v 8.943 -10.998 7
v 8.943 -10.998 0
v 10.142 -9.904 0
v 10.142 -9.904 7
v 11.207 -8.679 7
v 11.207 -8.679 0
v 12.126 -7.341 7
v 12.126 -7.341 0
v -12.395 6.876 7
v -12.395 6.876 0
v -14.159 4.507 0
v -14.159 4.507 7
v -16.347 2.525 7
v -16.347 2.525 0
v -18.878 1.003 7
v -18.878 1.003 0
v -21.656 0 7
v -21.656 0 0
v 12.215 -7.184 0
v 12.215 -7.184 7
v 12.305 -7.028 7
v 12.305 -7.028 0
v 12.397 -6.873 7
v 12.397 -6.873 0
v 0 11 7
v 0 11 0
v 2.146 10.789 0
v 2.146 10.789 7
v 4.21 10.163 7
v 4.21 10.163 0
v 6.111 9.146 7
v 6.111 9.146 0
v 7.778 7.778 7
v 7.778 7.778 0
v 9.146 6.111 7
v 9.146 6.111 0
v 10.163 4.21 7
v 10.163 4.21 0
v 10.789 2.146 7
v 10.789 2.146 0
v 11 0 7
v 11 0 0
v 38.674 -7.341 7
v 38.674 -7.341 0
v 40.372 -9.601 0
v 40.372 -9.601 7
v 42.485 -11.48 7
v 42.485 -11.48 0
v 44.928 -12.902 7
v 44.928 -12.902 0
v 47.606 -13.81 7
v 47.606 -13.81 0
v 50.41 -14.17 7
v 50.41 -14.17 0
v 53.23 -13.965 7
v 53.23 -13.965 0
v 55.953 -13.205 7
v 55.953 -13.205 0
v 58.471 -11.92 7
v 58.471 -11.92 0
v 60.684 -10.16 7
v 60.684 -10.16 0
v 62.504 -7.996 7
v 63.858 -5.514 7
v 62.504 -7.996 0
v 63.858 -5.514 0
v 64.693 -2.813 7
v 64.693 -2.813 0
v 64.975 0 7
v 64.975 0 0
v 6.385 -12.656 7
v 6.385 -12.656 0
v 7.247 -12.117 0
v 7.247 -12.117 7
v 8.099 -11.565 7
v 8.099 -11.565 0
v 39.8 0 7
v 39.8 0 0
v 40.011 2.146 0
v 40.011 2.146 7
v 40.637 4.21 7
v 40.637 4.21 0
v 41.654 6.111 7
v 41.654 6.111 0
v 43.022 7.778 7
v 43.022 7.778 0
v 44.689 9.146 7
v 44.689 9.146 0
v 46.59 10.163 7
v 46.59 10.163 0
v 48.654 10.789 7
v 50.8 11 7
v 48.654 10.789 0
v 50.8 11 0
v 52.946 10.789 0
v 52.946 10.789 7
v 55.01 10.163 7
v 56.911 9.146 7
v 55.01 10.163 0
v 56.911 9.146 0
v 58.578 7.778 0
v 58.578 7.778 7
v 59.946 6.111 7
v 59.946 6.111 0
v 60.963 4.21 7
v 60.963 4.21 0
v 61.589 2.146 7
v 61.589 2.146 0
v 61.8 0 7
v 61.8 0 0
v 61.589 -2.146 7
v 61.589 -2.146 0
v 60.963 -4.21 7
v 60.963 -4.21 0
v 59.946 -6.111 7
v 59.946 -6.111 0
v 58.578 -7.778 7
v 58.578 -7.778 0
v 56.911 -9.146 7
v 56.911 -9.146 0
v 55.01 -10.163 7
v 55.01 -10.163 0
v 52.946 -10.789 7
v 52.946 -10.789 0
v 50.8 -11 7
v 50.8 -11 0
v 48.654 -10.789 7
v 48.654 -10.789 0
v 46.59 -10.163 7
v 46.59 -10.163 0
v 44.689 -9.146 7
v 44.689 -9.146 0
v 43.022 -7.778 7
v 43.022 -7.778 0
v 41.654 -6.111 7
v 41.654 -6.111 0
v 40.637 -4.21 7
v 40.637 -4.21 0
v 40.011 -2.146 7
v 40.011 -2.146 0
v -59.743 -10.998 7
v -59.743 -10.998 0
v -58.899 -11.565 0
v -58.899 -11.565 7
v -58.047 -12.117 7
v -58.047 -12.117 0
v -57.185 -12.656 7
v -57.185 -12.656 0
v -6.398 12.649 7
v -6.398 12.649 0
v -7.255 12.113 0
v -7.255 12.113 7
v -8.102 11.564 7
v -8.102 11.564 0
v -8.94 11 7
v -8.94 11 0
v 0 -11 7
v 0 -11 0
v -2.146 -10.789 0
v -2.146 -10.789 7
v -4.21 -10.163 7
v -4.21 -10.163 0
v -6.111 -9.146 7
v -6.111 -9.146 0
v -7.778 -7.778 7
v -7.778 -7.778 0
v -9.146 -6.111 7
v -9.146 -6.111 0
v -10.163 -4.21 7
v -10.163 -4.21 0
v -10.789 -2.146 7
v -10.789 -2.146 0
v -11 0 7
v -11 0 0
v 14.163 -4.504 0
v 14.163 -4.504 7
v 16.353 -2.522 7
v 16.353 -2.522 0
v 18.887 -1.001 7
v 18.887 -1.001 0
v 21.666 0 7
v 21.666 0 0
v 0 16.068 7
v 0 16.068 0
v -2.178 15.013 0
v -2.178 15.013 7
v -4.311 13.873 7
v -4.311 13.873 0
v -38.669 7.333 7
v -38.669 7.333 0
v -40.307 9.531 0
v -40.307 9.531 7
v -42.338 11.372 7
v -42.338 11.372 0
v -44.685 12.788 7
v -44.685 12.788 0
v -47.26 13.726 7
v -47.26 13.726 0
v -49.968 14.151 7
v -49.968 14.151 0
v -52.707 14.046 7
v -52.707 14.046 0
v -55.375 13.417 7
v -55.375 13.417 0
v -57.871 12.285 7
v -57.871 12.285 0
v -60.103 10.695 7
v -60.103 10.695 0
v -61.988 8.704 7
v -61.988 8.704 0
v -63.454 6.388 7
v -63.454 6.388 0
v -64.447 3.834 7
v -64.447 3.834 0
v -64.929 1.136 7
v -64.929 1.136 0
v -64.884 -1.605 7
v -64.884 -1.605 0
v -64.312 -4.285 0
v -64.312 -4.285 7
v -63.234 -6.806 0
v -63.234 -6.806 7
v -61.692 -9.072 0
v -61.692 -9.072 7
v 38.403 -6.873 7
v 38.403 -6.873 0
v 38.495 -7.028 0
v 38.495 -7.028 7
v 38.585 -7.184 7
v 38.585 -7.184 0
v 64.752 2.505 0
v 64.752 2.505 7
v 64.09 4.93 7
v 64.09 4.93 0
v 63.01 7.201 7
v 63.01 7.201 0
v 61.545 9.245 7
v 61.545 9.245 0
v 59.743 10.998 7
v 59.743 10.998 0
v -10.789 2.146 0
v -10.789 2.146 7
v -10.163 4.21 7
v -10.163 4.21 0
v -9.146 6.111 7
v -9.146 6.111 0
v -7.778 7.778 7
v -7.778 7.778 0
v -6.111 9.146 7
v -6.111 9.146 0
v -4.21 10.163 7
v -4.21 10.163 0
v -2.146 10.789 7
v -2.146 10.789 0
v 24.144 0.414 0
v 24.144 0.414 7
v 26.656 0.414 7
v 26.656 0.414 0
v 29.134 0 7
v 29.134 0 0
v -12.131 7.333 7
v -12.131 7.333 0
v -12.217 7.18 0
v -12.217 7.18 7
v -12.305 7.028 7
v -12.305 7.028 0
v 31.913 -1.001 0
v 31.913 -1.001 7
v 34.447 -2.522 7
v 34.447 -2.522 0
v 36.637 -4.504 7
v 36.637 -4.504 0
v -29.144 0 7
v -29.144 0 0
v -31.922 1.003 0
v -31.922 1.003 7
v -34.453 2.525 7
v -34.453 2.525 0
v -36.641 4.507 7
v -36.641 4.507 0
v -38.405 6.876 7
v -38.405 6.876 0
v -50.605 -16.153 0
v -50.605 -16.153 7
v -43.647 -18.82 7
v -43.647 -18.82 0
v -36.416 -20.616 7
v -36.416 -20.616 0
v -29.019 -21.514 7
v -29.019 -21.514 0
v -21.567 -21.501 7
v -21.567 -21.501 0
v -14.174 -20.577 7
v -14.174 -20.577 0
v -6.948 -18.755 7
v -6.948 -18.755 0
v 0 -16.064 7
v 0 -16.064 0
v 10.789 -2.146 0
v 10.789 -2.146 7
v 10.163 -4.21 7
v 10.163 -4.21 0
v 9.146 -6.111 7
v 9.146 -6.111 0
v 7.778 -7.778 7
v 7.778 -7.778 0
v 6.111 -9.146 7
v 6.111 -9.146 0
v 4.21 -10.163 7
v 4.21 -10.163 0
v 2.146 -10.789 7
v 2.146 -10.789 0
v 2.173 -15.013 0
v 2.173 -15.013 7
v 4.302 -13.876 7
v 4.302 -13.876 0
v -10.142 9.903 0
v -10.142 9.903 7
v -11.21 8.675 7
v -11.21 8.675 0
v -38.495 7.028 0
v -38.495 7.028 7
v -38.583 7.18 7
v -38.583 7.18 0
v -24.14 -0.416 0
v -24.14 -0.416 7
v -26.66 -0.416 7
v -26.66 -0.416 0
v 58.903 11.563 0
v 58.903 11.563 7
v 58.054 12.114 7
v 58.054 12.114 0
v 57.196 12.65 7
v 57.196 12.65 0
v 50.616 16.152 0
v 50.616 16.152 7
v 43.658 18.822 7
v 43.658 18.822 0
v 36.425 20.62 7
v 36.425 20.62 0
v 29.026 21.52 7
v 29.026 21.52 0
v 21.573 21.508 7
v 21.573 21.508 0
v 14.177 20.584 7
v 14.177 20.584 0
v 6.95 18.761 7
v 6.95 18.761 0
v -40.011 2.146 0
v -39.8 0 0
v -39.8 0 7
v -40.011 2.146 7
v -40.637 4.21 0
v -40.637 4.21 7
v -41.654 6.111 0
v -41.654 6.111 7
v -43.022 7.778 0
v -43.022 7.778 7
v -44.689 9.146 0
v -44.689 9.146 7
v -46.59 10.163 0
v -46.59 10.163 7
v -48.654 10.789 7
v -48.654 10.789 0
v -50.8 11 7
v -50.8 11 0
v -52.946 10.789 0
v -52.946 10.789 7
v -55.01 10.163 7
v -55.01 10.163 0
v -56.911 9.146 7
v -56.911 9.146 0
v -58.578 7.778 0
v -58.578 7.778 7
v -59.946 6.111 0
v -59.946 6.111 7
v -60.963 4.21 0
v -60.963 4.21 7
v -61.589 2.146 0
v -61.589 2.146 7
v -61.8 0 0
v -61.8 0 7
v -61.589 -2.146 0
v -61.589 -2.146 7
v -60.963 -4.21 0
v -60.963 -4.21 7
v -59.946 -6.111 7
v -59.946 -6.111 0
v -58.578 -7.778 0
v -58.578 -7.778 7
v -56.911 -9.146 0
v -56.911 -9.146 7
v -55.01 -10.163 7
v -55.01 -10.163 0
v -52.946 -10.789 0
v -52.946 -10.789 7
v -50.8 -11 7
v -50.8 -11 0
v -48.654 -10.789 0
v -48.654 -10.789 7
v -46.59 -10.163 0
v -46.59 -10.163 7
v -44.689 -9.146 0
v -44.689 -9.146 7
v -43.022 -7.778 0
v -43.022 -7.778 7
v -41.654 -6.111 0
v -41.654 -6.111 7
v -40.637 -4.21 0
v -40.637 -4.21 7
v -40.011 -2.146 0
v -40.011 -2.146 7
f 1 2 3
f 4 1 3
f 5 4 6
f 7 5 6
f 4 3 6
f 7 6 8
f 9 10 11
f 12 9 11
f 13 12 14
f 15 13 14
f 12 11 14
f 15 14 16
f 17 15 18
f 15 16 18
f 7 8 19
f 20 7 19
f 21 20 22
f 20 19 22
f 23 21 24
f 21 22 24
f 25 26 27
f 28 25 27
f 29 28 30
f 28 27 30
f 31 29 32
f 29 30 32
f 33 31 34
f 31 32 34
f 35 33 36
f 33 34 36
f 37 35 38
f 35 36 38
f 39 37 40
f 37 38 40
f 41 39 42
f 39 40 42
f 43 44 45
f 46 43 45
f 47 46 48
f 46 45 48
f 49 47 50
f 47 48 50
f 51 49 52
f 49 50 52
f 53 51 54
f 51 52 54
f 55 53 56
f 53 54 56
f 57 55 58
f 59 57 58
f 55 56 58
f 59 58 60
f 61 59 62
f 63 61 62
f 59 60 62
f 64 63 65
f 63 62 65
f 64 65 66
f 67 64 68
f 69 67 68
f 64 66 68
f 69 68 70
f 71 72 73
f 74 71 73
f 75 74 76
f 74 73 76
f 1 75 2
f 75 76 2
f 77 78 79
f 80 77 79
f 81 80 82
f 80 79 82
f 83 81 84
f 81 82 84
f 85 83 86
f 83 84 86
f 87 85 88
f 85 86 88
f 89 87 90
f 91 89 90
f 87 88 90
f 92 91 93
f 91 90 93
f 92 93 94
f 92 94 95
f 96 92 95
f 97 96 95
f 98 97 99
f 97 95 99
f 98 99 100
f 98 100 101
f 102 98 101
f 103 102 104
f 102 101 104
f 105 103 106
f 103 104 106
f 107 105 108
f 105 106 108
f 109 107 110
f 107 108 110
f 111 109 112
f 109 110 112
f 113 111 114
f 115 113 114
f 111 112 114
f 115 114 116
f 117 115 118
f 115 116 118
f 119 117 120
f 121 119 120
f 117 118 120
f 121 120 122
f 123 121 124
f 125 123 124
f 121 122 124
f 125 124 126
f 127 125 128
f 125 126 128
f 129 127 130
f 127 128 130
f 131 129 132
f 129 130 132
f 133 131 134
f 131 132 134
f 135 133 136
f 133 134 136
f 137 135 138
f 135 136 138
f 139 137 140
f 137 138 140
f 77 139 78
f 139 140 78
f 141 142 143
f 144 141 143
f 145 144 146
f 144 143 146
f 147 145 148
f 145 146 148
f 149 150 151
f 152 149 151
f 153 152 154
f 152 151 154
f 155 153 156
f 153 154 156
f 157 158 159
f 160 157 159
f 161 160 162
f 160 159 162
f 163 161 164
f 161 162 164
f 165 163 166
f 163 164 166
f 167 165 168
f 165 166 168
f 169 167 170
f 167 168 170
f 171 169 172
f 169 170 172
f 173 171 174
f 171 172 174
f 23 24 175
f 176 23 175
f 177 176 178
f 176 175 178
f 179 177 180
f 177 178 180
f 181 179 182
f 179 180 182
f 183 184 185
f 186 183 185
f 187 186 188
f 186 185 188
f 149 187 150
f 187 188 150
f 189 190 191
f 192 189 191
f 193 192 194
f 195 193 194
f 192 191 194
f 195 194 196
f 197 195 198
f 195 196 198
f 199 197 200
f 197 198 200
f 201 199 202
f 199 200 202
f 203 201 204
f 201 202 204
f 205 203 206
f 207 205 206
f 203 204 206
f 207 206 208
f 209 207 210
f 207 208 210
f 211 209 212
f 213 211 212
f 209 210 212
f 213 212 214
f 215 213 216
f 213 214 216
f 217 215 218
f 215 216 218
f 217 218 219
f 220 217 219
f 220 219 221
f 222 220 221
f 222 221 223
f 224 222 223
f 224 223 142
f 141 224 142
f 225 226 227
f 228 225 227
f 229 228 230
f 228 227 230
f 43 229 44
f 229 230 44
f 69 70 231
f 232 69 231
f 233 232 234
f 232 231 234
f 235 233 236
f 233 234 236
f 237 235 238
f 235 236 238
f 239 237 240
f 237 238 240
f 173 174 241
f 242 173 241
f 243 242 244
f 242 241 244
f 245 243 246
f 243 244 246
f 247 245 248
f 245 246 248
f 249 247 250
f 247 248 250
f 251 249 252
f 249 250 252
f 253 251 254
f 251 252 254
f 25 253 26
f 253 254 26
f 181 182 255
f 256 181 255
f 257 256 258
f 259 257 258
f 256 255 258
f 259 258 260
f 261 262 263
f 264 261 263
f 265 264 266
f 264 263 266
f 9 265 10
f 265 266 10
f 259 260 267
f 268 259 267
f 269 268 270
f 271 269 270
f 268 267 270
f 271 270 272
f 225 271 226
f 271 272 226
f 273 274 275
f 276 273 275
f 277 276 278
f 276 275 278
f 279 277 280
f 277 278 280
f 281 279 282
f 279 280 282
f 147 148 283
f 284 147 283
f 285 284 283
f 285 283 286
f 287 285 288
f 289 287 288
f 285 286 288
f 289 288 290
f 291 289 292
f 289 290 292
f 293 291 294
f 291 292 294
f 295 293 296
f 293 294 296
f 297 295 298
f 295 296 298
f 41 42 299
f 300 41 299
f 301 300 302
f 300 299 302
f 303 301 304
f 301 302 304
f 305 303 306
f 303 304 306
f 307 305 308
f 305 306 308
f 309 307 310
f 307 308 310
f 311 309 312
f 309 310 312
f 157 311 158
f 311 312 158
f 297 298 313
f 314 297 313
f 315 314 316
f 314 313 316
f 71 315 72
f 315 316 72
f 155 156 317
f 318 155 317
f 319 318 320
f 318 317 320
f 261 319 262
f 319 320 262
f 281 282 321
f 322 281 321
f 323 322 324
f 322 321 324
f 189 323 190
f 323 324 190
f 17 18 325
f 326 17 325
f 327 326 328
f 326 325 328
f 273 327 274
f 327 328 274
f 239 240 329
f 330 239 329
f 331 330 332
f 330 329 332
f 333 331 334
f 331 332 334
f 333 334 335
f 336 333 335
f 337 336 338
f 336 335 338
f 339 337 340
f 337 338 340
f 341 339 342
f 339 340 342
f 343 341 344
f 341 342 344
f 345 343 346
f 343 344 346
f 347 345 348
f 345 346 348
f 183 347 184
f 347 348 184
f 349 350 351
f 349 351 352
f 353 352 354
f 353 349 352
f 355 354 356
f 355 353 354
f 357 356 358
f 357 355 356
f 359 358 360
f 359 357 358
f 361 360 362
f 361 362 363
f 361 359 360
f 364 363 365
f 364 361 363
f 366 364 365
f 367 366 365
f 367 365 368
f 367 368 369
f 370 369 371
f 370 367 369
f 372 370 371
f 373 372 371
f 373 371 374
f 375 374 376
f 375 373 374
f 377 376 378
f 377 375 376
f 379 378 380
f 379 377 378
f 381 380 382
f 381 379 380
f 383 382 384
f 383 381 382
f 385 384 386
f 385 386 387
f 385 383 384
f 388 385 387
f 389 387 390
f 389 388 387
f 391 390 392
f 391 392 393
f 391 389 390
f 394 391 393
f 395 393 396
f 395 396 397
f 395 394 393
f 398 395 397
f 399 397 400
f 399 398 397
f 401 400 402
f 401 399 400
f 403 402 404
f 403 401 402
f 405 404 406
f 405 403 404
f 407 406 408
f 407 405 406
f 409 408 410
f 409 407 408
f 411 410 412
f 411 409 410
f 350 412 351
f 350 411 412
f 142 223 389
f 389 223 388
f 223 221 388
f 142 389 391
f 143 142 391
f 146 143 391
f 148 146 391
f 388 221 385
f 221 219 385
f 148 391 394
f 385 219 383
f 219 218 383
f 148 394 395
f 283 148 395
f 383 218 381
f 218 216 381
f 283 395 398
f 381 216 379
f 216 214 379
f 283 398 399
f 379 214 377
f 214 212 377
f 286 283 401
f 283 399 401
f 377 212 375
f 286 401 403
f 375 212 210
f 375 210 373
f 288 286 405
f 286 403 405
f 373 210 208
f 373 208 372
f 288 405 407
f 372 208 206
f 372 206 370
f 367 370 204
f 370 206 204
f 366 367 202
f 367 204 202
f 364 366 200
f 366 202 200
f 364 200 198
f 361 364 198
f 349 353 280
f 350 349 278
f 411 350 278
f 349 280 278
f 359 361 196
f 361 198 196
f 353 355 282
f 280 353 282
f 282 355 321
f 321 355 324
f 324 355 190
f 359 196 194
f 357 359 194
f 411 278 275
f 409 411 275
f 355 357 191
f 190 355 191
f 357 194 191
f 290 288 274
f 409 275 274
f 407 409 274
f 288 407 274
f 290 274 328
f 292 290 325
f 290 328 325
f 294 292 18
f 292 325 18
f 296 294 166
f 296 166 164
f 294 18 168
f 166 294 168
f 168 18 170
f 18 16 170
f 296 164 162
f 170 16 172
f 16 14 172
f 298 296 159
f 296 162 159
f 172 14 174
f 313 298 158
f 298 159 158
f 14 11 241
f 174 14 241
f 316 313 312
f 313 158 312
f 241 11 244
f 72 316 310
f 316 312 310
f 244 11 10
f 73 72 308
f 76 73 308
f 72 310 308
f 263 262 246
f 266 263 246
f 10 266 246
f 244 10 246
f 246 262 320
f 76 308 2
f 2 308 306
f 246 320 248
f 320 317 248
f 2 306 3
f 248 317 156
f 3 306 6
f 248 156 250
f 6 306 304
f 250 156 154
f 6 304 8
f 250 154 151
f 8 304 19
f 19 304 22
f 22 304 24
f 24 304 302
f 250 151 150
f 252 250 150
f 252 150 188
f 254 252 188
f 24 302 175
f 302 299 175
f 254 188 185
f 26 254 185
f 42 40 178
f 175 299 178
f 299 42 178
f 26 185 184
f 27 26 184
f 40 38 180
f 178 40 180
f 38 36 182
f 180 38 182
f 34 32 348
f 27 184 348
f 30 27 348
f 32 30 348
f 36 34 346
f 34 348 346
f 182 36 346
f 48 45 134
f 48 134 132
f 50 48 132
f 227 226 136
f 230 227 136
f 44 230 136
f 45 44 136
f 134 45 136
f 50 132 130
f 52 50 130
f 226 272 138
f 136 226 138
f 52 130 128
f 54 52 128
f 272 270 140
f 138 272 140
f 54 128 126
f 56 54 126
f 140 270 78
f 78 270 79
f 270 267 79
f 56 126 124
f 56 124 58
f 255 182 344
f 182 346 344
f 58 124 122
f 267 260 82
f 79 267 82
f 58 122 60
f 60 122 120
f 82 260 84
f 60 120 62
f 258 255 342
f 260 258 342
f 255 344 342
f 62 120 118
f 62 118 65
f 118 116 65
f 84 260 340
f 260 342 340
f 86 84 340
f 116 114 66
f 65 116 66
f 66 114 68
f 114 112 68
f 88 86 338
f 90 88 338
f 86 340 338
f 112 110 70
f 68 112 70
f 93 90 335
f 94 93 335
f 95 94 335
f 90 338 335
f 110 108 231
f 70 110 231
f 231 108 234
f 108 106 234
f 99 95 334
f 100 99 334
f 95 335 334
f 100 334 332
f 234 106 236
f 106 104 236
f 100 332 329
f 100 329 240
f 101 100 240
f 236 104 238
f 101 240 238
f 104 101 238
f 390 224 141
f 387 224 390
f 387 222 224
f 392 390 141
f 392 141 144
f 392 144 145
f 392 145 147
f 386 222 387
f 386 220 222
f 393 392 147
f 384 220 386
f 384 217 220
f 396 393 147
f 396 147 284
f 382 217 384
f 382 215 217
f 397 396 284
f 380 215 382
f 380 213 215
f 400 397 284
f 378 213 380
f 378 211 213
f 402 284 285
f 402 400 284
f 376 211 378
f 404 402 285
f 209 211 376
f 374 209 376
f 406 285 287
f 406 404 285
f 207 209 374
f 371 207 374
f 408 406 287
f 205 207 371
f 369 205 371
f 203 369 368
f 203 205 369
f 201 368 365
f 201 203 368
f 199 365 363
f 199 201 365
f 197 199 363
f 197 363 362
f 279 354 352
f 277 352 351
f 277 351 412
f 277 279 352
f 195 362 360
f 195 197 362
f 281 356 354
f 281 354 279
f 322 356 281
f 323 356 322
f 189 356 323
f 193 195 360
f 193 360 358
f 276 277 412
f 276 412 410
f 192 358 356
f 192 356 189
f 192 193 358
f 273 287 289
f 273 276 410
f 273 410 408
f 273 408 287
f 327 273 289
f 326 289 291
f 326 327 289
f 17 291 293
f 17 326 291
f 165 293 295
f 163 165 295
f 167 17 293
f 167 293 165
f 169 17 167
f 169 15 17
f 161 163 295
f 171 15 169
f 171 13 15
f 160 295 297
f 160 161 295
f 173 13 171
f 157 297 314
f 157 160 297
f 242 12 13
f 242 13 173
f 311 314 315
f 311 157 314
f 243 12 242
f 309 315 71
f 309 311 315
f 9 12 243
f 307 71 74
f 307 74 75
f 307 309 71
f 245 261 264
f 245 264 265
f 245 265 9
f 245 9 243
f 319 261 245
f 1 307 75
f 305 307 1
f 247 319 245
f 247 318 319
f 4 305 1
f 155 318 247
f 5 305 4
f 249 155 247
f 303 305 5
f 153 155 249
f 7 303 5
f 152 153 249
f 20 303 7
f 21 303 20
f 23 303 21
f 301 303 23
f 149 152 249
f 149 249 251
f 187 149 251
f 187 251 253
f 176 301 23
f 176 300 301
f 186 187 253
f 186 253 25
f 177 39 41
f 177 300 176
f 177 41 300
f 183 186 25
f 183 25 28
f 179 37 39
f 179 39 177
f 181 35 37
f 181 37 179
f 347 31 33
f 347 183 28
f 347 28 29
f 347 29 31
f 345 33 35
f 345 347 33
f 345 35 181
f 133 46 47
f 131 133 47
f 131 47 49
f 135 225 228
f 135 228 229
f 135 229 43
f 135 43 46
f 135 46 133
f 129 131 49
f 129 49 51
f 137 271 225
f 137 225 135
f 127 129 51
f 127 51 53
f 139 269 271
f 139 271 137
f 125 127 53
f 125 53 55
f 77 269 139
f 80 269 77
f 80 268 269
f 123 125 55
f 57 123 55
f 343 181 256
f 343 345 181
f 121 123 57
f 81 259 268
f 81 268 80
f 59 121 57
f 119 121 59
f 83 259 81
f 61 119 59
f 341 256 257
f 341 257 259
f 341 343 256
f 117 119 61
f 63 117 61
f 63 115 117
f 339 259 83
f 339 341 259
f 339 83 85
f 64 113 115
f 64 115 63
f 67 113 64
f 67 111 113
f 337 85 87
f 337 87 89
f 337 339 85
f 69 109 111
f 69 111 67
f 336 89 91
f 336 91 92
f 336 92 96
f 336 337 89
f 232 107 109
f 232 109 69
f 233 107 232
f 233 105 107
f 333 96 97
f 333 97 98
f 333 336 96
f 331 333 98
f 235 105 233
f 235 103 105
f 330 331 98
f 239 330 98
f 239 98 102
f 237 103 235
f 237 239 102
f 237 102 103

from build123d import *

# Parameters (mm, degrees)
F0_R     = 11
F1_DEPTH = 7


with BuildPart() as f1:
    # F0 (on Top) → F1 (new body)
    with BuildSketch(Plane.XY):
        with BuildLine():
            Line((14.175, 0), (11, 0))
            ThreePointArc((11, 0), (7.7781745931, -7.7781745931), (0, -11))
            Line((0, -11), (0, -14.175))
            ThreePointArc((0, -14.175), (3.2814696071, -13.7899449679), (6.3846610647, -12.655699431))
            ThreePointArc((6.3846610647, -12.655699431), (7.6740188796, -11.8429761162), (8.9426071008, -10.9982))
            ThreePointArc((8.9426071008, -10.9982), (10.6919977036, -9.3065466262), (12.1262614453, -7.3406))
            ThreePointArc((12.1262614453, -7.3406), (12.2596266851, -7.1057126256), (12.3971479741, -6.8732341084))
            ThreePointArc((12.3971479741, -6.8732341084), (13.7233413849, -3.5497219939), (14.175, 0))
        make_face()
        with BuildLine():
            ThreePointArc((0, 11), (7.7781745931, 7.7781745931), (11, 0))
            Line((11, 0), (14.175, 0))
            ThreePointArc((14.175, 0), (10.0232386233, 10.0232386233), (0, 14.175))
            Line((0, 14.175), (0, 11))
        make_face()
        with BuildLine():
            ThreePointArc((-11, 0), (-7.7781745931, 7.7781745931), (0, 11))
            Line((0, 11), (0, 14.175))
            ThreePointArc((0, 14.175), (-3.2888623779, 13.7881836824), (-6.3982276645, 12.6488461036))
            ThreePointArc((-6.3982276645, 12.6488461036), (-7.6795852422, 11.8402648338), (-8.9403928885, 11))
            ThreePointArc((-8.9403928885, 11), (-10.6938487189, 9.304419626), (-12.1306573285, 7.3333333333))
            ThreePointArc((-12.1306573285, 7.3333333333), (-12.2610462299, 7.103700791), (-12.3954086387, 6.8763703856))
            ThreePointArc((-12.3954086387, 6.8763703856), (-13.7228922326, 3.5514579785), (-14.175, 0))
            Line((-14.175, 0), (-11, 0))
        make_face()
        with BuildLine():
            Line((0, -14.175), (0, -11))
            ThreePointArc((0, -11), (-7.7781745931, -7.7781745931), (-11, 0))
            Line((-11, 0), (-14.175, 0))
            ThreePointArc((-14.175, 0), (-10.0232386233, -10.0232386233), (0, -14.175))
        make_face()
        with BuildLine():
            ThreePointArc((0, 14.175), (10.0232386233, 10.0232386233), (14.175, 0))
            Line((14.175, 0), (21.6662, 0))
            ThreePointArc((21.6662, 0), (25.4, 0.4661082384), (29.1338, 0))
            Line((29.1338, 0), (36.625, 0))
            ThreePointArc((36.625, 0), (43.3747333645, 12.0746031153), (57.1958698966, 12.650038469))
            ThreePointArc((57.1958698966, 12.650038469), (29.0258725789, 21.5203456529), (0, 16.0678398574))
            Line((0, 16.0678398574), (0, 14.175))
        make_face()
        with BuildLine():
            Line((21.6662, 0), (14.175, 0))
            ThreePointArc((14.175, 0), (13.7233413849, -3.5497219939), (12.3971479741, -6.8732341084))
            ThreePointArc((12.3971479741, -6.8732341084), (16.353496972, -2.5220464261), (21.6662, 0))
        make_face()
        with BuildLine():
            ThreePointArc((-6.3982276645, 12.6488461036), (-3.2888623779, 13.7881836824), (0, 14.175))
            Line((0, 14.175), (0, 16.0678398574))
            ThreePointArc((0, 16.0678398574), (-3.2501607804, 14.453871086), (-6.3982276645, 12.6488461036))
        make_face()
        with BuildLine():
            Line((0, -16.0641572656), (0, -14.175))
            ThreePointArc((0, -14.175), (-10.0232386233, -10.0232386233), (-14.175, 0))
            Line((-14.175, 0), (-21.6559333333, 0))
            ThreePointArc((-21.6559333333, 0), (-25.4, -0.4688166689), (-29.1440666667, 0))
            Line((-29.1440666667, 0), (-36.625, 0))
            ThreePointArc((-36.625, 0), (-43.3693858125, -12.0713130104), (-57.1846610647, -12.655699431))
            ThreePointArc((-57.1846610647, -12.655699431), (-29.0187526069, -21.5141320936), (0, -16.0641572656))
        make_face()
        with BuildLine():
            ThreePointArc((6.3846610647, -12.655699431), (3.2814696071, -13.7899449679), (0, -14.175))
            Line((0, -14.175), (0, -16.0641572656))
            ThreePointArc((0, -16.0641572656), (3.2430752796, -14.4549824836), (6.3846610647, -12.655699431))
        make_face()
        with BuildLine():
            Line((-21.6559333333, 0), (-14.175, 0))
            ThreePointArc((-14.175, 0), (-13.7228922326, 3.5514579785), (-12.3954086387, 6.8763703856))
            ThreePointArc((-12.3954086387, 6.8763703856), (-16.3473482418, 2.5246764417), (-21.6559333333, 0))
        make_face()
        with BuildLine():
            Line((36.625, 0), (29.1338, 0))
            ThreePointArc((29.1338, 0), (34.446503028, -2.5220464261), (38.4028520259, -6.8732341084))
            ThreePointArc((38.4028520259, -6.8732341084), (37.0766586151, -3.5497219939), (36.625, 0))
        make_face()
        with BuildLine():
            ThreePointArc((59.7426071008, 10.9982), (58.47955068, 11.8400181351), (57.1958698966, 12.650038469))
            ThreePointArc((57.1958698966, 12.650038469), (43.3747333645, 12.0746031153), (36.625, 0))
            ThreePointArc((36.625, 0), (37.0766586151, -3.5497219939), (38.4028520259, -6.8732341084))
            ThreePointArc((38.4028520259, -6.8732341084), (38.5403733149, -7.1057126256), (38.6737385547, -7.3406))
            ThreePointArc((38.6737385547, -7.3406), (54.6105687904, -13.6532117281), (64.975, 0))
            ThreePointArc((64.975, 0), (63.6002359481, 6.0897113784), (59.7426071008, 10.9982))
        make_face()
        with BuildLine():
            ThreePointArc((61.8, 0), (50.8, -11), (39.8, 0))
            ThreePointArc((39.8, 0), (50.8, 11), (61.8, 0))
        make_face(mode=Mode.SUBTRACT)
        with BuildLine():
            ThreePointArc((-59.7426071008, -10.9982), (-58.4740188796, -11.8429761162), (-57.1846610647, -12.655699431))
            ThreePointArc((-57.1846610647, -12.655699431), (-43.3693858125, -12.0713130104), (-36.625, 0))
            ThreePointArc((-36.625, 0), (-37.0771077674, 3.5514579785), (-38.4045913613, 6.8763703856))
            ThreePointArc((-38.4045913613, 6.8763703856), (-38.5389537701, 7.103700791), (-38.6693426715, 7.3333333333))
            ThreePointArc((-38.6693426715, 7.3333333333), (-60.1033431975, 10.6947851941), (-59.7426071008, -10.9982))
        make_face()
        with Locations((-50.8, 0)):
            Circle(F0_R, mode=Mode.SUBTRACT)
        with BuildLine():
            Line((-36.625, 0), (-29.1440666667, 0))
            ThreePointArc((-29.1440666667, 0), (-34.4526517582, 2.5246764417), (-38.4045913613, 6.8763703856))
            ThreePointArc((-38.4045913613, 6.8763703856), (-37.0771077674, 3.5514579785), (-36.625, 0))
        make_face()
    extrude(amount=F1_DEPTH)


solid = f1.part
